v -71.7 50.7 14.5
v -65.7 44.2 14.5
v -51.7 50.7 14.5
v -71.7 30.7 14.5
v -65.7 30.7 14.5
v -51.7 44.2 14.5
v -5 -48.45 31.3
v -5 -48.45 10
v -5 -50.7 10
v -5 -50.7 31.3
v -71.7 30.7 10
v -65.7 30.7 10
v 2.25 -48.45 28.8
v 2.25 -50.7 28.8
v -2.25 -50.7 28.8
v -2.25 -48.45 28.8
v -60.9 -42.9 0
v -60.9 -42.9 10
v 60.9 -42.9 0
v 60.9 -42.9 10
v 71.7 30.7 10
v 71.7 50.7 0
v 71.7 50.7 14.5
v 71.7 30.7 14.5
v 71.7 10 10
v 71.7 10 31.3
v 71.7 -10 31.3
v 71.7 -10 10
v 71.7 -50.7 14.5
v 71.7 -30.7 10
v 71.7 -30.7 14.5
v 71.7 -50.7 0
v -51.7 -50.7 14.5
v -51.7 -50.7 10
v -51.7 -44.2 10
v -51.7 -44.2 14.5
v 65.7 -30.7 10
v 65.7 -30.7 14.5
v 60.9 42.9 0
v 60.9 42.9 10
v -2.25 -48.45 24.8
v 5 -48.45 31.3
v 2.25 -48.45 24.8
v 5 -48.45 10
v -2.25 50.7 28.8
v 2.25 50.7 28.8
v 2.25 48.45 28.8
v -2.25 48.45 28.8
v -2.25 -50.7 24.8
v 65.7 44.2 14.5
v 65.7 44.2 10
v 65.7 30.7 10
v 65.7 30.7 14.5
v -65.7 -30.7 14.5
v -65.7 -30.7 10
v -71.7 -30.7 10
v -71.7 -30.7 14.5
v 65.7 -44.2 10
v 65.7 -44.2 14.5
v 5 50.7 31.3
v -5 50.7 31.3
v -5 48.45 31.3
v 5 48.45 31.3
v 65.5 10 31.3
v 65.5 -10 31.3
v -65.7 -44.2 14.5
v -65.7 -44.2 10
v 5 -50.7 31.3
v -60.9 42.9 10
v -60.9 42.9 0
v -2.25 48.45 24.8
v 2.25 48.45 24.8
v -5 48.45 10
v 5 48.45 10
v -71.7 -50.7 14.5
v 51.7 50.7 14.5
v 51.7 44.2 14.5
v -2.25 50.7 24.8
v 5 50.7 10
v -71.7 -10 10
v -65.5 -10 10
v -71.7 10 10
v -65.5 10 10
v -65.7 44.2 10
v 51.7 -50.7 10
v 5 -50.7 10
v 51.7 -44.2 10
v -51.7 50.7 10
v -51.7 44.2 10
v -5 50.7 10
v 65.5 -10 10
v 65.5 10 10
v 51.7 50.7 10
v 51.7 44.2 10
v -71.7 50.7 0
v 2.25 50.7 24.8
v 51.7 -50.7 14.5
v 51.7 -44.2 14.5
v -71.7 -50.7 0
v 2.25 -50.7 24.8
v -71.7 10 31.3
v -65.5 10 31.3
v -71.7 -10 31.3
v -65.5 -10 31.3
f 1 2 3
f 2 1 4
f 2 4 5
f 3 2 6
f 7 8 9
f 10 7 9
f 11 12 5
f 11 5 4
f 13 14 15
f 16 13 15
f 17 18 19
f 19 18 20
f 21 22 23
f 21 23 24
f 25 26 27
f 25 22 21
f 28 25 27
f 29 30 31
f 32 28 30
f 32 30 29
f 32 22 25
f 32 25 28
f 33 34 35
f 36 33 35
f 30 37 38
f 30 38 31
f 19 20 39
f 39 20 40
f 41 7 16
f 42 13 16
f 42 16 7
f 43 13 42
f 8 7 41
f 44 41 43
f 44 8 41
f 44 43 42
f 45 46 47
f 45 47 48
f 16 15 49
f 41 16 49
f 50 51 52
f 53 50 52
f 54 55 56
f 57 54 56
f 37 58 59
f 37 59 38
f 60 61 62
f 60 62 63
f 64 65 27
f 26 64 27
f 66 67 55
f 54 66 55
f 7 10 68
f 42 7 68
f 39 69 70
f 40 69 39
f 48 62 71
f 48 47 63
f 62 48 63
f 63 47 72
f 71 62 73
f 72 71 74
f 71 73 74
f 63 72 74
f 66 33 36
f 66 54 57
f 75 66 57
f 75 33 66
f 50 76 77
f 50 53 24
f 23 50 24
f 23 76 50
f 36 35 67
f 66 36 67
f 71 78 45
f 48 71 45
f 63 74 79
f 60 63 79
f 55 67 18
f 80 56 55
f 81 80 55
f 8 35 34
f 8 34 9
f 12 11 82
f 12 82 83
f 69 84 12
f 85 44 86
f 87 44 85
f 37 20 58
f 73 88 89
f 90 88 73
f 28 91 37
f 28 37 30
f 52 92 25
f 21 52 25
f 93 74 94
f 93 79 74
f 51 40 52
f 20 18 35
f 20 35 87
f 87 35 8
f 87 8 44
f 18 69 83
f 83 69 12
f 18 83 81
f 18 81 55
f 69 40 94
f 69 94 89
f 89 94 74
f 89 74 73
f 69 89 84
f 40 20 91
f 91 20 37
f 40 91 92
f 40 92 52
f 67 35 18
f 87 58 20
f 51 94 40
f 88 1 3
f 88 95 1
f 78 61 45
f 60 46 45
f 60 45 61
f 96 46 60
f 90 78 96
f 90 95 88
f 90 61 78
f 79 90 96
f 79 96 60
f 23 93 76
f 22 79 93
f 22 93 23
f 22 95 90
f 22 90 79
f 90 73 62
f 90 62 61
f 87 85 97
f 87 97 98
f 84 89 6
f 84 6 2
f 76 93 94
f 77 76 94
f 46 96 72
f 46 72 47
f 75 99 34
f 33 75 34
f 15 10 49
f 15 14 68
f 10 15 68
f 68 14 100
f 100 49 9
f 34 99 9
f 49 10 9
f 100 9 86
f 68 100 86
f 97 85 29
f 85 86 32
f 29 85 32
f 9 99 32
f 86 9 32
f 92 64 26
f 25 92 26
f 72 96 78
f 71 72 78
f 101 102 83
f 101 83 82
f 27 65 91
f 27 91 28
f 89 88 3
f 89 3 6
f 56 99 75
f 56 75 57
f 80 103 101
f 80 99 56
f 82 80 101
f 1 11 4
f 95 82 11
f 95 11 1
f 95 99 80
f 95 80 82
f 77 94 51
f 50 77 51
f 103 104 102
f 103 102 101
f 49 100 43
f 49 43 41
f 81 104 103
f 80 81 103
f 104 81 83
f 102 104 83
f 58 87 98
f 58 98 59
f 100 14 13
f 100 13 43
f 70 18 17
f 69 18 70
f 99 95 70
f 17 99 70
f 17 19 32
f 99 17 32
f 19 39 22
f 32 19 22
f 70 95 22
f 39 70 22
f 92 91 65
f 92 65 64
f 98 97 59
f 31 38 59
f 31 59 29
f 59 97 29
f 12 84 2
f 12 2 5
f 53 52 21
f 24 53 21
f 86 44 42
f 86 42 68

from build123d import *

# Parameters (mm, degrees)
SKETCH2_W                 = 143.4
SKETCH2_H                 = 101.4
BOSS_EXTRUDE2_DEPTH       = 10
SKETCH3_W                 = 121.8
SKETCH3_H                 = 85.8
CUT_EXTRUDE1_DEPTH        = 89.382011744
BOSS_EXTRUDE4_DEPTH       = 4.5
SKETCH8_W                 = 6.2
SKETCH8_H                 = 20
SKETCH8_W_2               = 10
SKETCH8_H_2               = 2.25
BOSS_EXTRUDE5_DEPTH       = 21.3
CUT_EXTRUDE3_REACH        = 130.072
SKETCH10_W                = 4.5
SKETCH10_H                = 4
MIRROR2_COPY_1_DEPTH      = 4.5
MIRROR2_COPY_2_SKETCH_W   = 6.2
MIRROR2_COPY_2_SKETCH_H   = 20
MIRROR2_COPY_2_SKETCH_W_2 = 10
MIRROR2_COPY_2_SKETCH_H_2 = 2.25
MIRROR2_COPY_2_DEPTH      = 21.3
MIRROR2_COPY_3_REACH      = 130.072
MIRROR2_COPY_3_SKETCH_W   = 4.5
MIRROR2_COPY_3_SKETCH_H   = 4
MIRROR2_COPY_4_DEPTH      = 4.5
MIRROR2_COPY_5_REACH      = 130.072
MIRROR2_COPY_5_SKETCH_W   = 4.5
MIRROR2_COPY_5_SKETCH_H   = 4


with BuildPart() as part:
    # Sketch2 → Boss-Extrude2 (new body)
    with BuildSketch(Plane.XY):
        Rectangle(SKETCH2_W, SKETCH2_H)
    extrude(amount=BOSS_EXTRUDE2_DEPTH)

    # Sketch3 → Cut-Extrude1 (cut, through all)
    with BuildSketch(Plane.XY.offset(10)):
        Rectangle(SKETCH3_W, SKETCH3_H)
    extrude(amount=-CUT_EXTRUDE1_DEPTH, mode=Mode.SUBTRACT)

    # Sketch6 → Boss-Extrude4 (add)
    with BuildSketch(Plane.XY.offset(10)):
        Polygon((51.7, 50.7), (51.7, 44.2), (65.7, 44.2), (65.7, 30.7), (71.7, 30.7), (71.7, 50.7), align=None)
    boss_extrude4 = extrude(amount=BOSS_EXTRUDE4_DEPTH)

    # Sketch8 → Boss-Extrude5 (add)
    with BuildSketch(Plane.XY.offset(10)):
        with Locations((68.6, 0)):
            Rectangle(SKETCH8_W, SKETCH8_H)
        with Locations((0, 49.575)):
            Rectangle(SKETCH8_W_2, SKETCH8_H_2)
    boss_extrude5 = extrude(amount=BOSS_EXTRUDE5_DEPTH)

    # Sketch10 → Cut-Extrude3 (cut, up to next)
    with BuildSketch(Plane(origin=(0, 50.7, 0), x_dir=(1, 0, 0), z_dir=(0, 1, 0)), mode=Mode.PRIVATE) as cut_extrude3_sk1:
        with Locations((0, -26.8)):
            Rectangle(SKETCH10_W, SKETCH10_H)
    cut_extrude3_tool1 = extrude(cut_extrude3_sk1.sketch, amount=-CUT_EXTRUDE3_REACH, mode=Mode.PRIVATE) & part.part
    cut_extrude3 = cut_extrude3_tool1.solids().sort_by_distance((0, 50.7, 26.8))[0]
    add(cut_extrude3, mode=Mode.SUBTRACT)

    # Mirror1: Boss-Extrude4, Boss-Extrude5, Cut-Extrude3 across plane
    add(boss_extrude4.mirror(Plane.ZX))
    add(boss_extrude5.mirror(Plane.ZX))
    add(cut_extrude3.mirror(Plane.ZX), mode=Mode.SUBTRACT)

    # Mirror2: Boss-Extrude5 across plane
    add(boss_extrude5.mirror(Plane(origin=(0, 0, 0), x_dir=(0, 0, 1), z_dir=(1, 0, 0))))

    # Mirror2 copy 1 sketch → Mirror2 copy 1 (add)
    with BuildSketch(Plane(origin=(0, 0, 10), x_dir=(-1, 0, 0), z_dir=(0, 0, 1))):
        Polygon((51.7, 50.7), (51.7, 44.2), (65.7, 44.2), (65.7, 30.7), (71.7, 30.7), (71.7, 50.7), align=None)
    extrude(amount=MIRROR2_COPY_1_DEPTH)

    # Mirror2 copy 2 sketch → Mirror2 copy 2 (add)
    with BuildSketch(Plane(origin=(0, 0, 10), x_dir=(-1, 0, 0), z_dir=(0, 0, 1))):
        with Locations((68.6, 0)):
            Rectangle(MIRROR2_COPY_2_SKETCH_W, MIRROR2_COPY_2_SKETCH_H)
        with Locations((0, 49.575)):
            Rectangle(MIRROR2_COPY_2_SKETCH_W_2, MIRROR2_COPY_2_SKETCH_H_2)
    extrude(amount=MIRROR2_COPY_2_DEPTH)

    # Mirror2 copy 3 sketch → Mirror2 copy 3 (cut, up to next)
    with BuildSketch(Plane(origin=(0, -50.7, 0), x_dir=(-1, 0, 0), z_dir=(0, -1, 0)), mode=Mode.PRIVATE) as mirror2_copy_3_sk1:
        with Locations((0, -26.8)):
            Rectangle(MIRROR2_COPY_3_SKETCH_W, MIRROR2_COPY_3_SKETCH_H)
    mirror2_copy_3_tool1 = extrude(mirror2_copy_3_sk1.sketch, amount=-MIRROR2_COPY_3_REACH, mode=Mode.PRIVATE) & part.part
    add(mirror2_copy_3_tool1.solids().sort_by_distance((0, -50.7, 26.8))[0], mode=Mode.SUBTRACT)

    # Mirror2 copy 4 sketch → Mirror2 copy 4 (add)
    with BuildSketch(Plane(origin=(0, 0, 10), x_dir=(-1, 0, 0), z_dir=(0, 0, 1))):
        Polygon((51.7, -50.7), (51.7, -44.2), (65.7, -44.2), (65.7, -30.7), (71.7, -30.7), (71.7, -50.7), align=None)
    extrude(amount=MIRROR2_COPY_4_DEPTH)

    # Mirror2 copy 5 sketch → Mirror2 copy 5 (cut, up to next)
    with BuildSketch(Plane(origin=(0, 50.7, 0), x_dir=(-1, 0, 0), z_dir=(0, 1, 0)), mode=Mode.PRIVATE) as mirror2_copy_5_sk1:
        with Locations((0, 26.8)):
            Rectangle(MIRROR2_COPY_5_SKETCH_W, MIRROR2_COPY_5_SKETCH_H)
    mirror2_copy_5_tool1 = extrude(mirror2_copy_5_sk1.sketch, amount=-MIRROR2_COPY_5_REACH, mode=Mode.PRIVATE) & part.part
    add(mirror2_copy_5_tool1.solids().sort_by_distance((0, 50.7, 26.8))[0], mode=Mode.SUBTRACT)


solid = part.part
